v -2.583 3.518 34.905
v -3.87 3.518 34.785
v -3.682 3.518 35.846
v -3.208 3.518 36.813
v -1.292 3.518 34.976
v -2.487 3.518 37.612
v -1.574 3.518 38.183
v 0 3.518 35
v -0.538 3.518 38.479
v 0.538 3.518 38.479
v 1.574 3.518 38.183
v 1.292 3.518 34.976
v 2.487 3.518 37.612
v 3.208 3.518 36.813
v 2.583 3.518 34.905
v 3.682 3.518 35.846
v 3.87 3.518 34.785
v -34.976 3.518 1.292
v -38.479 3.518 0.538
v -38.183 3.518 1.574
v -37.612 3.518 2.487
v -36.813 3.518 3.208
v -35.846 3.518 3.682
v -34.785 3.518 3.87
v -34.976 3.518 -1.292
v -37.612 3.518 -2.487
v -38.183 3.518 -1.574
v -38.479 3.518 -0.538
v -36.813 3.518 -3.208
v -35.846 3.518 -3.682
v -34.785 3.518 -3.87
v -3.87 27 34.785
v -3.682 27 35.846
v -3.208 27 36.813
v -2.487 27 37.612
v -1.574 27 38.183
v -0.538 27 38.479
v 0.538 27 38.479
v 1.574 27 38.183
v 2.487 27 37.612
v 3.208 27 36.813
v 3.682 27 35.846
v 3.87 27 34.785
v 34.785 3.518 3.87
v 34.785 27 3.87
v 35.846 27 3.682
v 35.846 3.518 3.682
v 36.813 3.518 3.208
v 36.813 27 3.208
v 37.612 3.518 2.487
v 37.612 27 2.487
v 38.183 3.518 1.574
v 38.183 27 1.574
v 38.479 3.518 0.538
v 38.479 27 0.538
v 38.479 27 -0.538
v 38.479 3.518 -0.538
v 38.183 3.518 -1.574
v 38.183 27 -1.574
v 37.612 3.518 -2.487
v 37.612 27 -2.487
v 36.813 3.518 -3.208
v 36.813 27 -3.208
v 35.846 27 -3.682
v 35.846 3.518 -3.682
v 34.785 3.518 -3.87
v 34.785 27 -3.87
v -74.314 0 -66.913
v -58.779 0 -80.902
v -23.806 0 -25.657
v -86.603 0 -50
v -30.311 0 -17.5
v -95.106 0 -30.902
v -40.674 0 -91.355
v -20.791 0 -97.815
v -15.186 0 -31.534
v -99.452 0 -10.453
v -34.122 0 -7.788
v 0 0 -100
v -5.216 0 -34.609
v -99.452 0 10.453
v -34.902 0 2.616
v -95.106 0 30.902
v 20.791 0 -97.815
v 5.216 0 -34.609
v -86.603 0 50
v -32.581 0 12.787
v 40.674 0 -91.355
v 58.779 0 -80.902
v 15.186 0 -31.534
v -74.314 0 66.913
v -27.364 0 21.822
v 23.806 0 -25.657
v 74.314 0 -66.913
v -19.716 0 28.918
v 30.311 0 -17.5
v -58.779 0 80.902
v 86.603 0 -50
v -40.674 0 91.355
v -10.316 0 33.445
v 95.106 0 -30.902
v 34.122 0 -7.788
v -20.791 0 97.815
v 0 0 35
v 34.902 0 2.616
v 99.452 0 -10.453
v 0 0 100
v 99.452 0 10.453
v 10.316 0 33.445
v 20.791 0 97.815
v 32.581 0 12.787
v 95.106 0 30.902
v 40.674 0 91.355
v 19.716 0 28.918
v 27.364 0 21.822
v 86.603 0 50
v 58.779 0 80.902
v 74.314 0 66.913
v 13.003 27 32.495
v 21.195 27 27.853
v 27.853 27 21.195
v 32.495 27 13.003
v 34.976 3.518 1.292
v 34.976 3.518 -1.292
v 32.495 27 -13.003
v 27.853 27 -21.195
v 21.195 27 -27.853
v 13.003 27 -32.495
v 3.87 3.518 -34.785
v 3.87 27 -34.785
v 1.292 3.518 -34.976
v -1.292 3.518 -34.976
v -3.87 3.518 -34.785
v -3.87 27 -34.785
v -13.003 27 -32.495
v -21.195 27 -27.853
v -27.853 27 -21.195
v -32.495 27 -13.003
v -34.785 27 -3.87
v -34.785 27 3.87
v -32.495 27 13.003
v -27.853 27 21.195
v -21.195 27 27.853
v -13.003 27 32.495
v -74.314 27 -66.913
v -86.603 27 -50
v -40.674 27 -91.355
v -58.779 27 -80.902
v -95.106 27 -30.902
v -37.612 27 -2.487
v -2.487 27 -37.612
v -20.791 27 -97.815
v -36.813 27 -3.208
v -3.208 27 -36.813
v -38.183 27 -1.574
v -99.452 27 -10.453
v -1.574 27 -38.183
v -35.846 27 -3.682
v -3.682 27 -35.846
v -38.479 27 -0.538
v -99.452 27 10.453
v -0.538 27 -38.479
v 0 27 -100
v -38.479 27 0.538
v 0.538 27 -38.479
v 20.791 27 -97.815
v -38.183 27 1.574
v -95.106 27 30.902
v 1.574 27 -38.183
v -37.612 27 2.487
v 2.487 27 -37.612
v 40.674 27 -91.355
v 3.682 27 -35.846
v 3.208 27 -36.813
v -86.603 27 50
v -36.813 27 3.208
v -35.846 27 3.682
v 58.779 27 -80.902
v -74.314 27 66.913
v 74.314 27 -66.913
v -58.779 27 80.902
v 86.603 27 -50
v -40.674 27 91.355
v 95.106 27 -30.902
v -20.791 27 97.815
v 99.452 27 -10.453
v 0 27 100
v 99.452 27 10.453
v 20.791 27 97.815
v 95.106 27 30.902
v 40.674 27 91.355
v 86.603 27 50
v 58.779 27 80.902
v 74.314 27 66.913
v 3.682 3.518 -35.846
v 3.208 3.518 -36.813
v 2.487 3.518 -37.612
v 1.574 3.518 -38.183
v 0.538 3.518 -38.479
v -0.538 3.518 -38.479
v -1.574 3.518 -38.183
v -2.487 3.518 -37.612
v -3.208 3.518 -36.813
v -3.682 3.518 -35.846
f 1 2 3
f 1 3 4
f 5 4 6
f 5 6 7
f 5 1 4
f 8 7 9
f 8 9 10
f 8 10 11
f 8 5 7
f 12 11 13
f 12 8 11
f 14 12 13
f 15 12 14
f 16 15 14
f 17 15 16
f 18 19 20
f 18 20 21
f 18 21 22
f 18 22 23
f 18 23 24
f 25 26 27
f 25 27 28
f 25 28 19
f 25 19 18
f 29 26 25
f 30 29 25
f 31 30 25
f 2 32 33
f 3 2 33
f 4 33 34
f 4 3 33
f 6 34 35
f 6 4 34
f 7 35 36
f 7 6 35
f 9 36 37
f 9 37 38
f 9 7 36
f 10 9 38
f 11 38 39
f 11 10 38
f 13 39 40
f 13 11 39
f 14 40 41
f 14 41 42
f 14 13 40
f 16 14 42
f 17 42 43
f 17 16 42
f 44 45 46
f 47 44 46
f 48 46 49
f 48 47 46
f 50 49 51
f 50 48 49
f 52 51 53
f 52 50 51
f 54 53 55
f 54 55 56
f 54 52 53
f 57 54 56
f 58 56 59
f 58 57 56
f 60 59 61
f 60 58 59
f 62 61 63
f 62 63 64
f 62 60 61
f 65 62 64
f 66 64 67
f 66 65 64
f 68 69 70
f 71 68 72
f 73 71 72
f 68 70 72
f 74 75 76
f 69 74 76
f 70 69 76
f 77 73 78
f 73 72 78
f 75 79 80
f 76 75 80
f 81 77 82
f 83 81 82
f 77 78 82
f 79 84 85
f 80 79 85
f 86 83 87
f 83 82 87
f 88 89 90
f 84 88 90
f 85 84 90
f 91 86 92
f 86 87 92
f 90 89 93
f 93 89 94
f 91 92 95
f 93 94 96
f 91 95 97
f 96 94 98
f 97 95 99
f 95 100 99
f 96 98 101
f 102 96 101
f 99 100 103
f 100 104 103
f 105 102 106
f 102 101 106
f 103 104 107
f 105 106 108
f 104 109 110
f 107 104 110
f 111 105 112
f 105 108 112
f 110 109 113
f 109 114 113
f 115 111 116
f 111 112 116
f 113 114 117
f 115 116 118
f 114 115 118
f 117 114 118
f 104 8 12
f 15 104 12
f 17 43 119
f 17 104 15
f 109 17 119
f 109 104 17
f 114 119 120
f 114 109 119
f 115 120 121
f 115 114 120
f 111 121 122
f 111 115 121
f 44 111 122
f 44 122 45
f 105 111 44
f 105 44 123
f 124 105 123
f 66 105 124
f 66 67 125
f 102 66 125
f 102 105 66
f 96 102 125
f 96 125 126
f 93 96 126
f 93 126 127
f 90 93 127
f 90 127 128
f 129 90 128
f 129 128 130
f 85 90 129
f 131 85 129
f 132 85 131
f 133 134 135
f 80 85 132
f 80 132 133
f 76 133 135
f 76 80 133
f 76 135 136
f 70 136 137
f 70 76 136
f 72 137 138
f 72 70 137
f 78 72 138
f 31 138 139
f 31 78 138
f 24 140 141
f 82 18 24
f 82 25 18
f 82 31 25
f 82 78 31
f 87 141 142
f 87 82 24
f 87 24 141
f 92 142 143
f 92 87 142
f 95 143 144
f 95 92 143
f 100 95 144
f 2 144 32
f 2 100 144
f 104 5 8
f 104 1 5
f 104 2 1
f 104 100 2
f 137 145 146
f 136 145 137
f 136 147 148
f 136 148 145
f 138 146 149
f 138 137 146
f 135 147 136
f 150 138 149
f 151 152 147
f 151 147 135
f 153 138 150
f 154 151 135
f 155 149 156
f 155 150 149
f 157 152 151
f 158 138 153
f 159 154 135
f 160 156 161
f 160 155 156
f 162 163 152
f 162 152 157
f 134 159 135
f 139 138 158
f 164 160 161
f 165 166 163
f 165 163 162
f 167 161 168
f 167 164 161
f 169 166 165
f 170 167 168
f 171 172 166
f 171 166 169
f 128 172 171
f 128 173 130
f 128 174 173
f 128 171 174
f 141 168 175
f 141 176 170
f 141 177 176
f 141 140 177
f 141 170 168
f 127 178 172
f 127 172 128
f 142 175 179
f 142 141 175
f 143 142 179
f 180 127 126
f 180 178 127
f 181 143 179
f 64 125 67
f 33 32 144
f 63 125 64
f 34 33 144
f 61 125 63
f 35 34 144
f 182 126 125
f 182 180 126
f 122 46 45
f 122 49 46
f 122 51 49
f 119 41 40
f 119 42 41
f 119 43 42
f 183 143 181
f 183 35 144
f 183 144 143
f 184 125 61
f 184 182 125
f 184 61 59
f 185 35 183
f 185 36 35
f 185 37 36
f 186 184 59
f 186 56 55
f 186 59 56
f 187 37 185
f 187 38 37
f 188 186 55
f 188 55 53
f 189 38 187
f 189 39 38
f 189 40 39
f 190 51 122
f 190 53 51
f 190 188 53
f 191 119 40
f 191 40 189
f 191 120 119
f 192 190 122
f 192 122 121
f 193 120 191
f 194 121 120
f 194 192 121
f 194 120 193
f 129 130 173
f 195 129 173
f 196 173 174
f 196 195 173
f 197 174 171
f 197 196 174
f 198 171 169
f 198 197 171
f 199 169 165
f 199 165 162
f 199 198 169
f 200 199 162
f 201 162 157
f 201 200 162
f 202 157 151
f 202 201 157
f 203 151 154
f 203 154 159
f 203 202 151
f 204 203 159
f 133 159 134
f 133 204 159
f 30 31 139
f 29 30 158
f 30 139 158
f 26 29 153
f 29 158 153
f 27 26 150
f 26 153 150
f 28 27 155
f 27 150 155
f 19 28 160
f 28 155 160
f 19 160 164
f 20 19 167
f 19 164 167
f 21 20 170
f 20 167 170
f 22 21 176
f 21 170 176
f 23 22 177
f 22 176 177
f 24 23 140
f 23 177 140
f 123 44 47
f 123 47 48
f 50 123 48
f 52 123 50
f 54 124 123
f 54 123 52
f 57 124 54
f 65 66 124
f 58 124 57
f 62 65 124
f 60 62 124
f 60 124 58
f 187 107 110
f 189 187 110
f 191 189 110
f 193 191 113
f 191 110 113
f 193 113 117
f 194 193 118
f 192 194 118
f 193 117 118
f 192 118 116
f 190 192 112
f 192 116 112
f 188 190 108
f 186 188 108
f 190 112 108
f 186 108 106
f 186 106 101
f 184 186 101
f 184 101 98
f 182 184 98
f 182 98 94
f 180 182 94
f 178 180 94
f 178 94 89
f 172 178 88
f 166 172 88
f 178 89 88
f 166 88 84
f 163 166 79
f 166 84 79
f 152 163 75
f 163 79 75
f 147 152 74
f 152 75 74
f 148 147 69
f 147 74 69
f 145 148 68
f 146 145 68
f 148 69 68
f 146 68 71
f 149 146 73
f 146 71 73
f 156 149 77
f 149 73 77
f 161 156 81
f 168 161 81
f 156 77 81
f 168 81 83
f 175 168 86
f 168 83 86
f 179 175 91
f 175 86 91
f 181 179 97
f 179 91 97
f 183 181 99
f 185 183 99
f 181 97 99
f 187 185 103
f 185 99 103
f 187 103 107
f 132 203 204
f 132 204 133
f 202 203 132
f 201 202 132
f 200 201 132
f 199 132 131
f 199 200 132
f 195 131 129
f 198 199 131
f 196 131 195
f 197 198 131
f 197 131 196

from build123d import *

# Parameters (mm, degrees)
SKETCH1_R           = 100
BOSS_EXTRUDE1_DEPTH = 27
SKETCH2_R           = 35
CUT_EXTRUDE1_DEPTH  = 144.975692393
SKETCH3_R           = 3.87281734
CUT_EXTRUDE2_DEPTH  = 23.482064542
CIRPATTERN1_COUNT   = 4


with BuildPart() as part:
    # Sketch1 → Boss-Extrude1 (new body)
    with BuildSketch(Plane(origin=(0, 0, 0), x_dir=(1, 0, 0), z_dir=(0, 1, 0))):
        Circle(SKETCH1_R)
    extrude(amount=BOSS_EXTRUDE1_DEPTH)

    # Sketch2 → Cut-Extrude1 (cut, through all)
    with BuildSketch(Plane(origin=(0, 0, 0), x_dir=(1, 0, 0), z_dir=(0, 1, 0))):
        Circle(SKETCH2_R)
    extrude(amount=CUT_EXTRUDE1_DEPTH, mode=Mode.SUBTRACT)

    # Sketch3 → Cut-Extrude2 (cut)
    with BuildSketch(Plane(origin=(0, 27, 0), x_dir=(1, 0, 0), z_dir=(0, 1, 0))):
        with Locations((-34.643895565, 0)):
            Circle(SKETCH3_R)
    cut_extrude2 = extrude(amount=-CUT_EXTRUDE2_DEPTH, mode=Mode.SUBTRACT)

    # CirPattern1: Cut-Extrude2 ×4 about axis
    cirpattern1_axis = Axis((0, 0, 0), (0, 1, 0))
    for i in range(1, CIRPATTERN1_COUNT):
        add(cut_extrude2.rotate(cirpattern1_axis, i * 360 / CIRPATTERN1_COUNT), mode=Mode.SUBTRACT)


solid = part.part
